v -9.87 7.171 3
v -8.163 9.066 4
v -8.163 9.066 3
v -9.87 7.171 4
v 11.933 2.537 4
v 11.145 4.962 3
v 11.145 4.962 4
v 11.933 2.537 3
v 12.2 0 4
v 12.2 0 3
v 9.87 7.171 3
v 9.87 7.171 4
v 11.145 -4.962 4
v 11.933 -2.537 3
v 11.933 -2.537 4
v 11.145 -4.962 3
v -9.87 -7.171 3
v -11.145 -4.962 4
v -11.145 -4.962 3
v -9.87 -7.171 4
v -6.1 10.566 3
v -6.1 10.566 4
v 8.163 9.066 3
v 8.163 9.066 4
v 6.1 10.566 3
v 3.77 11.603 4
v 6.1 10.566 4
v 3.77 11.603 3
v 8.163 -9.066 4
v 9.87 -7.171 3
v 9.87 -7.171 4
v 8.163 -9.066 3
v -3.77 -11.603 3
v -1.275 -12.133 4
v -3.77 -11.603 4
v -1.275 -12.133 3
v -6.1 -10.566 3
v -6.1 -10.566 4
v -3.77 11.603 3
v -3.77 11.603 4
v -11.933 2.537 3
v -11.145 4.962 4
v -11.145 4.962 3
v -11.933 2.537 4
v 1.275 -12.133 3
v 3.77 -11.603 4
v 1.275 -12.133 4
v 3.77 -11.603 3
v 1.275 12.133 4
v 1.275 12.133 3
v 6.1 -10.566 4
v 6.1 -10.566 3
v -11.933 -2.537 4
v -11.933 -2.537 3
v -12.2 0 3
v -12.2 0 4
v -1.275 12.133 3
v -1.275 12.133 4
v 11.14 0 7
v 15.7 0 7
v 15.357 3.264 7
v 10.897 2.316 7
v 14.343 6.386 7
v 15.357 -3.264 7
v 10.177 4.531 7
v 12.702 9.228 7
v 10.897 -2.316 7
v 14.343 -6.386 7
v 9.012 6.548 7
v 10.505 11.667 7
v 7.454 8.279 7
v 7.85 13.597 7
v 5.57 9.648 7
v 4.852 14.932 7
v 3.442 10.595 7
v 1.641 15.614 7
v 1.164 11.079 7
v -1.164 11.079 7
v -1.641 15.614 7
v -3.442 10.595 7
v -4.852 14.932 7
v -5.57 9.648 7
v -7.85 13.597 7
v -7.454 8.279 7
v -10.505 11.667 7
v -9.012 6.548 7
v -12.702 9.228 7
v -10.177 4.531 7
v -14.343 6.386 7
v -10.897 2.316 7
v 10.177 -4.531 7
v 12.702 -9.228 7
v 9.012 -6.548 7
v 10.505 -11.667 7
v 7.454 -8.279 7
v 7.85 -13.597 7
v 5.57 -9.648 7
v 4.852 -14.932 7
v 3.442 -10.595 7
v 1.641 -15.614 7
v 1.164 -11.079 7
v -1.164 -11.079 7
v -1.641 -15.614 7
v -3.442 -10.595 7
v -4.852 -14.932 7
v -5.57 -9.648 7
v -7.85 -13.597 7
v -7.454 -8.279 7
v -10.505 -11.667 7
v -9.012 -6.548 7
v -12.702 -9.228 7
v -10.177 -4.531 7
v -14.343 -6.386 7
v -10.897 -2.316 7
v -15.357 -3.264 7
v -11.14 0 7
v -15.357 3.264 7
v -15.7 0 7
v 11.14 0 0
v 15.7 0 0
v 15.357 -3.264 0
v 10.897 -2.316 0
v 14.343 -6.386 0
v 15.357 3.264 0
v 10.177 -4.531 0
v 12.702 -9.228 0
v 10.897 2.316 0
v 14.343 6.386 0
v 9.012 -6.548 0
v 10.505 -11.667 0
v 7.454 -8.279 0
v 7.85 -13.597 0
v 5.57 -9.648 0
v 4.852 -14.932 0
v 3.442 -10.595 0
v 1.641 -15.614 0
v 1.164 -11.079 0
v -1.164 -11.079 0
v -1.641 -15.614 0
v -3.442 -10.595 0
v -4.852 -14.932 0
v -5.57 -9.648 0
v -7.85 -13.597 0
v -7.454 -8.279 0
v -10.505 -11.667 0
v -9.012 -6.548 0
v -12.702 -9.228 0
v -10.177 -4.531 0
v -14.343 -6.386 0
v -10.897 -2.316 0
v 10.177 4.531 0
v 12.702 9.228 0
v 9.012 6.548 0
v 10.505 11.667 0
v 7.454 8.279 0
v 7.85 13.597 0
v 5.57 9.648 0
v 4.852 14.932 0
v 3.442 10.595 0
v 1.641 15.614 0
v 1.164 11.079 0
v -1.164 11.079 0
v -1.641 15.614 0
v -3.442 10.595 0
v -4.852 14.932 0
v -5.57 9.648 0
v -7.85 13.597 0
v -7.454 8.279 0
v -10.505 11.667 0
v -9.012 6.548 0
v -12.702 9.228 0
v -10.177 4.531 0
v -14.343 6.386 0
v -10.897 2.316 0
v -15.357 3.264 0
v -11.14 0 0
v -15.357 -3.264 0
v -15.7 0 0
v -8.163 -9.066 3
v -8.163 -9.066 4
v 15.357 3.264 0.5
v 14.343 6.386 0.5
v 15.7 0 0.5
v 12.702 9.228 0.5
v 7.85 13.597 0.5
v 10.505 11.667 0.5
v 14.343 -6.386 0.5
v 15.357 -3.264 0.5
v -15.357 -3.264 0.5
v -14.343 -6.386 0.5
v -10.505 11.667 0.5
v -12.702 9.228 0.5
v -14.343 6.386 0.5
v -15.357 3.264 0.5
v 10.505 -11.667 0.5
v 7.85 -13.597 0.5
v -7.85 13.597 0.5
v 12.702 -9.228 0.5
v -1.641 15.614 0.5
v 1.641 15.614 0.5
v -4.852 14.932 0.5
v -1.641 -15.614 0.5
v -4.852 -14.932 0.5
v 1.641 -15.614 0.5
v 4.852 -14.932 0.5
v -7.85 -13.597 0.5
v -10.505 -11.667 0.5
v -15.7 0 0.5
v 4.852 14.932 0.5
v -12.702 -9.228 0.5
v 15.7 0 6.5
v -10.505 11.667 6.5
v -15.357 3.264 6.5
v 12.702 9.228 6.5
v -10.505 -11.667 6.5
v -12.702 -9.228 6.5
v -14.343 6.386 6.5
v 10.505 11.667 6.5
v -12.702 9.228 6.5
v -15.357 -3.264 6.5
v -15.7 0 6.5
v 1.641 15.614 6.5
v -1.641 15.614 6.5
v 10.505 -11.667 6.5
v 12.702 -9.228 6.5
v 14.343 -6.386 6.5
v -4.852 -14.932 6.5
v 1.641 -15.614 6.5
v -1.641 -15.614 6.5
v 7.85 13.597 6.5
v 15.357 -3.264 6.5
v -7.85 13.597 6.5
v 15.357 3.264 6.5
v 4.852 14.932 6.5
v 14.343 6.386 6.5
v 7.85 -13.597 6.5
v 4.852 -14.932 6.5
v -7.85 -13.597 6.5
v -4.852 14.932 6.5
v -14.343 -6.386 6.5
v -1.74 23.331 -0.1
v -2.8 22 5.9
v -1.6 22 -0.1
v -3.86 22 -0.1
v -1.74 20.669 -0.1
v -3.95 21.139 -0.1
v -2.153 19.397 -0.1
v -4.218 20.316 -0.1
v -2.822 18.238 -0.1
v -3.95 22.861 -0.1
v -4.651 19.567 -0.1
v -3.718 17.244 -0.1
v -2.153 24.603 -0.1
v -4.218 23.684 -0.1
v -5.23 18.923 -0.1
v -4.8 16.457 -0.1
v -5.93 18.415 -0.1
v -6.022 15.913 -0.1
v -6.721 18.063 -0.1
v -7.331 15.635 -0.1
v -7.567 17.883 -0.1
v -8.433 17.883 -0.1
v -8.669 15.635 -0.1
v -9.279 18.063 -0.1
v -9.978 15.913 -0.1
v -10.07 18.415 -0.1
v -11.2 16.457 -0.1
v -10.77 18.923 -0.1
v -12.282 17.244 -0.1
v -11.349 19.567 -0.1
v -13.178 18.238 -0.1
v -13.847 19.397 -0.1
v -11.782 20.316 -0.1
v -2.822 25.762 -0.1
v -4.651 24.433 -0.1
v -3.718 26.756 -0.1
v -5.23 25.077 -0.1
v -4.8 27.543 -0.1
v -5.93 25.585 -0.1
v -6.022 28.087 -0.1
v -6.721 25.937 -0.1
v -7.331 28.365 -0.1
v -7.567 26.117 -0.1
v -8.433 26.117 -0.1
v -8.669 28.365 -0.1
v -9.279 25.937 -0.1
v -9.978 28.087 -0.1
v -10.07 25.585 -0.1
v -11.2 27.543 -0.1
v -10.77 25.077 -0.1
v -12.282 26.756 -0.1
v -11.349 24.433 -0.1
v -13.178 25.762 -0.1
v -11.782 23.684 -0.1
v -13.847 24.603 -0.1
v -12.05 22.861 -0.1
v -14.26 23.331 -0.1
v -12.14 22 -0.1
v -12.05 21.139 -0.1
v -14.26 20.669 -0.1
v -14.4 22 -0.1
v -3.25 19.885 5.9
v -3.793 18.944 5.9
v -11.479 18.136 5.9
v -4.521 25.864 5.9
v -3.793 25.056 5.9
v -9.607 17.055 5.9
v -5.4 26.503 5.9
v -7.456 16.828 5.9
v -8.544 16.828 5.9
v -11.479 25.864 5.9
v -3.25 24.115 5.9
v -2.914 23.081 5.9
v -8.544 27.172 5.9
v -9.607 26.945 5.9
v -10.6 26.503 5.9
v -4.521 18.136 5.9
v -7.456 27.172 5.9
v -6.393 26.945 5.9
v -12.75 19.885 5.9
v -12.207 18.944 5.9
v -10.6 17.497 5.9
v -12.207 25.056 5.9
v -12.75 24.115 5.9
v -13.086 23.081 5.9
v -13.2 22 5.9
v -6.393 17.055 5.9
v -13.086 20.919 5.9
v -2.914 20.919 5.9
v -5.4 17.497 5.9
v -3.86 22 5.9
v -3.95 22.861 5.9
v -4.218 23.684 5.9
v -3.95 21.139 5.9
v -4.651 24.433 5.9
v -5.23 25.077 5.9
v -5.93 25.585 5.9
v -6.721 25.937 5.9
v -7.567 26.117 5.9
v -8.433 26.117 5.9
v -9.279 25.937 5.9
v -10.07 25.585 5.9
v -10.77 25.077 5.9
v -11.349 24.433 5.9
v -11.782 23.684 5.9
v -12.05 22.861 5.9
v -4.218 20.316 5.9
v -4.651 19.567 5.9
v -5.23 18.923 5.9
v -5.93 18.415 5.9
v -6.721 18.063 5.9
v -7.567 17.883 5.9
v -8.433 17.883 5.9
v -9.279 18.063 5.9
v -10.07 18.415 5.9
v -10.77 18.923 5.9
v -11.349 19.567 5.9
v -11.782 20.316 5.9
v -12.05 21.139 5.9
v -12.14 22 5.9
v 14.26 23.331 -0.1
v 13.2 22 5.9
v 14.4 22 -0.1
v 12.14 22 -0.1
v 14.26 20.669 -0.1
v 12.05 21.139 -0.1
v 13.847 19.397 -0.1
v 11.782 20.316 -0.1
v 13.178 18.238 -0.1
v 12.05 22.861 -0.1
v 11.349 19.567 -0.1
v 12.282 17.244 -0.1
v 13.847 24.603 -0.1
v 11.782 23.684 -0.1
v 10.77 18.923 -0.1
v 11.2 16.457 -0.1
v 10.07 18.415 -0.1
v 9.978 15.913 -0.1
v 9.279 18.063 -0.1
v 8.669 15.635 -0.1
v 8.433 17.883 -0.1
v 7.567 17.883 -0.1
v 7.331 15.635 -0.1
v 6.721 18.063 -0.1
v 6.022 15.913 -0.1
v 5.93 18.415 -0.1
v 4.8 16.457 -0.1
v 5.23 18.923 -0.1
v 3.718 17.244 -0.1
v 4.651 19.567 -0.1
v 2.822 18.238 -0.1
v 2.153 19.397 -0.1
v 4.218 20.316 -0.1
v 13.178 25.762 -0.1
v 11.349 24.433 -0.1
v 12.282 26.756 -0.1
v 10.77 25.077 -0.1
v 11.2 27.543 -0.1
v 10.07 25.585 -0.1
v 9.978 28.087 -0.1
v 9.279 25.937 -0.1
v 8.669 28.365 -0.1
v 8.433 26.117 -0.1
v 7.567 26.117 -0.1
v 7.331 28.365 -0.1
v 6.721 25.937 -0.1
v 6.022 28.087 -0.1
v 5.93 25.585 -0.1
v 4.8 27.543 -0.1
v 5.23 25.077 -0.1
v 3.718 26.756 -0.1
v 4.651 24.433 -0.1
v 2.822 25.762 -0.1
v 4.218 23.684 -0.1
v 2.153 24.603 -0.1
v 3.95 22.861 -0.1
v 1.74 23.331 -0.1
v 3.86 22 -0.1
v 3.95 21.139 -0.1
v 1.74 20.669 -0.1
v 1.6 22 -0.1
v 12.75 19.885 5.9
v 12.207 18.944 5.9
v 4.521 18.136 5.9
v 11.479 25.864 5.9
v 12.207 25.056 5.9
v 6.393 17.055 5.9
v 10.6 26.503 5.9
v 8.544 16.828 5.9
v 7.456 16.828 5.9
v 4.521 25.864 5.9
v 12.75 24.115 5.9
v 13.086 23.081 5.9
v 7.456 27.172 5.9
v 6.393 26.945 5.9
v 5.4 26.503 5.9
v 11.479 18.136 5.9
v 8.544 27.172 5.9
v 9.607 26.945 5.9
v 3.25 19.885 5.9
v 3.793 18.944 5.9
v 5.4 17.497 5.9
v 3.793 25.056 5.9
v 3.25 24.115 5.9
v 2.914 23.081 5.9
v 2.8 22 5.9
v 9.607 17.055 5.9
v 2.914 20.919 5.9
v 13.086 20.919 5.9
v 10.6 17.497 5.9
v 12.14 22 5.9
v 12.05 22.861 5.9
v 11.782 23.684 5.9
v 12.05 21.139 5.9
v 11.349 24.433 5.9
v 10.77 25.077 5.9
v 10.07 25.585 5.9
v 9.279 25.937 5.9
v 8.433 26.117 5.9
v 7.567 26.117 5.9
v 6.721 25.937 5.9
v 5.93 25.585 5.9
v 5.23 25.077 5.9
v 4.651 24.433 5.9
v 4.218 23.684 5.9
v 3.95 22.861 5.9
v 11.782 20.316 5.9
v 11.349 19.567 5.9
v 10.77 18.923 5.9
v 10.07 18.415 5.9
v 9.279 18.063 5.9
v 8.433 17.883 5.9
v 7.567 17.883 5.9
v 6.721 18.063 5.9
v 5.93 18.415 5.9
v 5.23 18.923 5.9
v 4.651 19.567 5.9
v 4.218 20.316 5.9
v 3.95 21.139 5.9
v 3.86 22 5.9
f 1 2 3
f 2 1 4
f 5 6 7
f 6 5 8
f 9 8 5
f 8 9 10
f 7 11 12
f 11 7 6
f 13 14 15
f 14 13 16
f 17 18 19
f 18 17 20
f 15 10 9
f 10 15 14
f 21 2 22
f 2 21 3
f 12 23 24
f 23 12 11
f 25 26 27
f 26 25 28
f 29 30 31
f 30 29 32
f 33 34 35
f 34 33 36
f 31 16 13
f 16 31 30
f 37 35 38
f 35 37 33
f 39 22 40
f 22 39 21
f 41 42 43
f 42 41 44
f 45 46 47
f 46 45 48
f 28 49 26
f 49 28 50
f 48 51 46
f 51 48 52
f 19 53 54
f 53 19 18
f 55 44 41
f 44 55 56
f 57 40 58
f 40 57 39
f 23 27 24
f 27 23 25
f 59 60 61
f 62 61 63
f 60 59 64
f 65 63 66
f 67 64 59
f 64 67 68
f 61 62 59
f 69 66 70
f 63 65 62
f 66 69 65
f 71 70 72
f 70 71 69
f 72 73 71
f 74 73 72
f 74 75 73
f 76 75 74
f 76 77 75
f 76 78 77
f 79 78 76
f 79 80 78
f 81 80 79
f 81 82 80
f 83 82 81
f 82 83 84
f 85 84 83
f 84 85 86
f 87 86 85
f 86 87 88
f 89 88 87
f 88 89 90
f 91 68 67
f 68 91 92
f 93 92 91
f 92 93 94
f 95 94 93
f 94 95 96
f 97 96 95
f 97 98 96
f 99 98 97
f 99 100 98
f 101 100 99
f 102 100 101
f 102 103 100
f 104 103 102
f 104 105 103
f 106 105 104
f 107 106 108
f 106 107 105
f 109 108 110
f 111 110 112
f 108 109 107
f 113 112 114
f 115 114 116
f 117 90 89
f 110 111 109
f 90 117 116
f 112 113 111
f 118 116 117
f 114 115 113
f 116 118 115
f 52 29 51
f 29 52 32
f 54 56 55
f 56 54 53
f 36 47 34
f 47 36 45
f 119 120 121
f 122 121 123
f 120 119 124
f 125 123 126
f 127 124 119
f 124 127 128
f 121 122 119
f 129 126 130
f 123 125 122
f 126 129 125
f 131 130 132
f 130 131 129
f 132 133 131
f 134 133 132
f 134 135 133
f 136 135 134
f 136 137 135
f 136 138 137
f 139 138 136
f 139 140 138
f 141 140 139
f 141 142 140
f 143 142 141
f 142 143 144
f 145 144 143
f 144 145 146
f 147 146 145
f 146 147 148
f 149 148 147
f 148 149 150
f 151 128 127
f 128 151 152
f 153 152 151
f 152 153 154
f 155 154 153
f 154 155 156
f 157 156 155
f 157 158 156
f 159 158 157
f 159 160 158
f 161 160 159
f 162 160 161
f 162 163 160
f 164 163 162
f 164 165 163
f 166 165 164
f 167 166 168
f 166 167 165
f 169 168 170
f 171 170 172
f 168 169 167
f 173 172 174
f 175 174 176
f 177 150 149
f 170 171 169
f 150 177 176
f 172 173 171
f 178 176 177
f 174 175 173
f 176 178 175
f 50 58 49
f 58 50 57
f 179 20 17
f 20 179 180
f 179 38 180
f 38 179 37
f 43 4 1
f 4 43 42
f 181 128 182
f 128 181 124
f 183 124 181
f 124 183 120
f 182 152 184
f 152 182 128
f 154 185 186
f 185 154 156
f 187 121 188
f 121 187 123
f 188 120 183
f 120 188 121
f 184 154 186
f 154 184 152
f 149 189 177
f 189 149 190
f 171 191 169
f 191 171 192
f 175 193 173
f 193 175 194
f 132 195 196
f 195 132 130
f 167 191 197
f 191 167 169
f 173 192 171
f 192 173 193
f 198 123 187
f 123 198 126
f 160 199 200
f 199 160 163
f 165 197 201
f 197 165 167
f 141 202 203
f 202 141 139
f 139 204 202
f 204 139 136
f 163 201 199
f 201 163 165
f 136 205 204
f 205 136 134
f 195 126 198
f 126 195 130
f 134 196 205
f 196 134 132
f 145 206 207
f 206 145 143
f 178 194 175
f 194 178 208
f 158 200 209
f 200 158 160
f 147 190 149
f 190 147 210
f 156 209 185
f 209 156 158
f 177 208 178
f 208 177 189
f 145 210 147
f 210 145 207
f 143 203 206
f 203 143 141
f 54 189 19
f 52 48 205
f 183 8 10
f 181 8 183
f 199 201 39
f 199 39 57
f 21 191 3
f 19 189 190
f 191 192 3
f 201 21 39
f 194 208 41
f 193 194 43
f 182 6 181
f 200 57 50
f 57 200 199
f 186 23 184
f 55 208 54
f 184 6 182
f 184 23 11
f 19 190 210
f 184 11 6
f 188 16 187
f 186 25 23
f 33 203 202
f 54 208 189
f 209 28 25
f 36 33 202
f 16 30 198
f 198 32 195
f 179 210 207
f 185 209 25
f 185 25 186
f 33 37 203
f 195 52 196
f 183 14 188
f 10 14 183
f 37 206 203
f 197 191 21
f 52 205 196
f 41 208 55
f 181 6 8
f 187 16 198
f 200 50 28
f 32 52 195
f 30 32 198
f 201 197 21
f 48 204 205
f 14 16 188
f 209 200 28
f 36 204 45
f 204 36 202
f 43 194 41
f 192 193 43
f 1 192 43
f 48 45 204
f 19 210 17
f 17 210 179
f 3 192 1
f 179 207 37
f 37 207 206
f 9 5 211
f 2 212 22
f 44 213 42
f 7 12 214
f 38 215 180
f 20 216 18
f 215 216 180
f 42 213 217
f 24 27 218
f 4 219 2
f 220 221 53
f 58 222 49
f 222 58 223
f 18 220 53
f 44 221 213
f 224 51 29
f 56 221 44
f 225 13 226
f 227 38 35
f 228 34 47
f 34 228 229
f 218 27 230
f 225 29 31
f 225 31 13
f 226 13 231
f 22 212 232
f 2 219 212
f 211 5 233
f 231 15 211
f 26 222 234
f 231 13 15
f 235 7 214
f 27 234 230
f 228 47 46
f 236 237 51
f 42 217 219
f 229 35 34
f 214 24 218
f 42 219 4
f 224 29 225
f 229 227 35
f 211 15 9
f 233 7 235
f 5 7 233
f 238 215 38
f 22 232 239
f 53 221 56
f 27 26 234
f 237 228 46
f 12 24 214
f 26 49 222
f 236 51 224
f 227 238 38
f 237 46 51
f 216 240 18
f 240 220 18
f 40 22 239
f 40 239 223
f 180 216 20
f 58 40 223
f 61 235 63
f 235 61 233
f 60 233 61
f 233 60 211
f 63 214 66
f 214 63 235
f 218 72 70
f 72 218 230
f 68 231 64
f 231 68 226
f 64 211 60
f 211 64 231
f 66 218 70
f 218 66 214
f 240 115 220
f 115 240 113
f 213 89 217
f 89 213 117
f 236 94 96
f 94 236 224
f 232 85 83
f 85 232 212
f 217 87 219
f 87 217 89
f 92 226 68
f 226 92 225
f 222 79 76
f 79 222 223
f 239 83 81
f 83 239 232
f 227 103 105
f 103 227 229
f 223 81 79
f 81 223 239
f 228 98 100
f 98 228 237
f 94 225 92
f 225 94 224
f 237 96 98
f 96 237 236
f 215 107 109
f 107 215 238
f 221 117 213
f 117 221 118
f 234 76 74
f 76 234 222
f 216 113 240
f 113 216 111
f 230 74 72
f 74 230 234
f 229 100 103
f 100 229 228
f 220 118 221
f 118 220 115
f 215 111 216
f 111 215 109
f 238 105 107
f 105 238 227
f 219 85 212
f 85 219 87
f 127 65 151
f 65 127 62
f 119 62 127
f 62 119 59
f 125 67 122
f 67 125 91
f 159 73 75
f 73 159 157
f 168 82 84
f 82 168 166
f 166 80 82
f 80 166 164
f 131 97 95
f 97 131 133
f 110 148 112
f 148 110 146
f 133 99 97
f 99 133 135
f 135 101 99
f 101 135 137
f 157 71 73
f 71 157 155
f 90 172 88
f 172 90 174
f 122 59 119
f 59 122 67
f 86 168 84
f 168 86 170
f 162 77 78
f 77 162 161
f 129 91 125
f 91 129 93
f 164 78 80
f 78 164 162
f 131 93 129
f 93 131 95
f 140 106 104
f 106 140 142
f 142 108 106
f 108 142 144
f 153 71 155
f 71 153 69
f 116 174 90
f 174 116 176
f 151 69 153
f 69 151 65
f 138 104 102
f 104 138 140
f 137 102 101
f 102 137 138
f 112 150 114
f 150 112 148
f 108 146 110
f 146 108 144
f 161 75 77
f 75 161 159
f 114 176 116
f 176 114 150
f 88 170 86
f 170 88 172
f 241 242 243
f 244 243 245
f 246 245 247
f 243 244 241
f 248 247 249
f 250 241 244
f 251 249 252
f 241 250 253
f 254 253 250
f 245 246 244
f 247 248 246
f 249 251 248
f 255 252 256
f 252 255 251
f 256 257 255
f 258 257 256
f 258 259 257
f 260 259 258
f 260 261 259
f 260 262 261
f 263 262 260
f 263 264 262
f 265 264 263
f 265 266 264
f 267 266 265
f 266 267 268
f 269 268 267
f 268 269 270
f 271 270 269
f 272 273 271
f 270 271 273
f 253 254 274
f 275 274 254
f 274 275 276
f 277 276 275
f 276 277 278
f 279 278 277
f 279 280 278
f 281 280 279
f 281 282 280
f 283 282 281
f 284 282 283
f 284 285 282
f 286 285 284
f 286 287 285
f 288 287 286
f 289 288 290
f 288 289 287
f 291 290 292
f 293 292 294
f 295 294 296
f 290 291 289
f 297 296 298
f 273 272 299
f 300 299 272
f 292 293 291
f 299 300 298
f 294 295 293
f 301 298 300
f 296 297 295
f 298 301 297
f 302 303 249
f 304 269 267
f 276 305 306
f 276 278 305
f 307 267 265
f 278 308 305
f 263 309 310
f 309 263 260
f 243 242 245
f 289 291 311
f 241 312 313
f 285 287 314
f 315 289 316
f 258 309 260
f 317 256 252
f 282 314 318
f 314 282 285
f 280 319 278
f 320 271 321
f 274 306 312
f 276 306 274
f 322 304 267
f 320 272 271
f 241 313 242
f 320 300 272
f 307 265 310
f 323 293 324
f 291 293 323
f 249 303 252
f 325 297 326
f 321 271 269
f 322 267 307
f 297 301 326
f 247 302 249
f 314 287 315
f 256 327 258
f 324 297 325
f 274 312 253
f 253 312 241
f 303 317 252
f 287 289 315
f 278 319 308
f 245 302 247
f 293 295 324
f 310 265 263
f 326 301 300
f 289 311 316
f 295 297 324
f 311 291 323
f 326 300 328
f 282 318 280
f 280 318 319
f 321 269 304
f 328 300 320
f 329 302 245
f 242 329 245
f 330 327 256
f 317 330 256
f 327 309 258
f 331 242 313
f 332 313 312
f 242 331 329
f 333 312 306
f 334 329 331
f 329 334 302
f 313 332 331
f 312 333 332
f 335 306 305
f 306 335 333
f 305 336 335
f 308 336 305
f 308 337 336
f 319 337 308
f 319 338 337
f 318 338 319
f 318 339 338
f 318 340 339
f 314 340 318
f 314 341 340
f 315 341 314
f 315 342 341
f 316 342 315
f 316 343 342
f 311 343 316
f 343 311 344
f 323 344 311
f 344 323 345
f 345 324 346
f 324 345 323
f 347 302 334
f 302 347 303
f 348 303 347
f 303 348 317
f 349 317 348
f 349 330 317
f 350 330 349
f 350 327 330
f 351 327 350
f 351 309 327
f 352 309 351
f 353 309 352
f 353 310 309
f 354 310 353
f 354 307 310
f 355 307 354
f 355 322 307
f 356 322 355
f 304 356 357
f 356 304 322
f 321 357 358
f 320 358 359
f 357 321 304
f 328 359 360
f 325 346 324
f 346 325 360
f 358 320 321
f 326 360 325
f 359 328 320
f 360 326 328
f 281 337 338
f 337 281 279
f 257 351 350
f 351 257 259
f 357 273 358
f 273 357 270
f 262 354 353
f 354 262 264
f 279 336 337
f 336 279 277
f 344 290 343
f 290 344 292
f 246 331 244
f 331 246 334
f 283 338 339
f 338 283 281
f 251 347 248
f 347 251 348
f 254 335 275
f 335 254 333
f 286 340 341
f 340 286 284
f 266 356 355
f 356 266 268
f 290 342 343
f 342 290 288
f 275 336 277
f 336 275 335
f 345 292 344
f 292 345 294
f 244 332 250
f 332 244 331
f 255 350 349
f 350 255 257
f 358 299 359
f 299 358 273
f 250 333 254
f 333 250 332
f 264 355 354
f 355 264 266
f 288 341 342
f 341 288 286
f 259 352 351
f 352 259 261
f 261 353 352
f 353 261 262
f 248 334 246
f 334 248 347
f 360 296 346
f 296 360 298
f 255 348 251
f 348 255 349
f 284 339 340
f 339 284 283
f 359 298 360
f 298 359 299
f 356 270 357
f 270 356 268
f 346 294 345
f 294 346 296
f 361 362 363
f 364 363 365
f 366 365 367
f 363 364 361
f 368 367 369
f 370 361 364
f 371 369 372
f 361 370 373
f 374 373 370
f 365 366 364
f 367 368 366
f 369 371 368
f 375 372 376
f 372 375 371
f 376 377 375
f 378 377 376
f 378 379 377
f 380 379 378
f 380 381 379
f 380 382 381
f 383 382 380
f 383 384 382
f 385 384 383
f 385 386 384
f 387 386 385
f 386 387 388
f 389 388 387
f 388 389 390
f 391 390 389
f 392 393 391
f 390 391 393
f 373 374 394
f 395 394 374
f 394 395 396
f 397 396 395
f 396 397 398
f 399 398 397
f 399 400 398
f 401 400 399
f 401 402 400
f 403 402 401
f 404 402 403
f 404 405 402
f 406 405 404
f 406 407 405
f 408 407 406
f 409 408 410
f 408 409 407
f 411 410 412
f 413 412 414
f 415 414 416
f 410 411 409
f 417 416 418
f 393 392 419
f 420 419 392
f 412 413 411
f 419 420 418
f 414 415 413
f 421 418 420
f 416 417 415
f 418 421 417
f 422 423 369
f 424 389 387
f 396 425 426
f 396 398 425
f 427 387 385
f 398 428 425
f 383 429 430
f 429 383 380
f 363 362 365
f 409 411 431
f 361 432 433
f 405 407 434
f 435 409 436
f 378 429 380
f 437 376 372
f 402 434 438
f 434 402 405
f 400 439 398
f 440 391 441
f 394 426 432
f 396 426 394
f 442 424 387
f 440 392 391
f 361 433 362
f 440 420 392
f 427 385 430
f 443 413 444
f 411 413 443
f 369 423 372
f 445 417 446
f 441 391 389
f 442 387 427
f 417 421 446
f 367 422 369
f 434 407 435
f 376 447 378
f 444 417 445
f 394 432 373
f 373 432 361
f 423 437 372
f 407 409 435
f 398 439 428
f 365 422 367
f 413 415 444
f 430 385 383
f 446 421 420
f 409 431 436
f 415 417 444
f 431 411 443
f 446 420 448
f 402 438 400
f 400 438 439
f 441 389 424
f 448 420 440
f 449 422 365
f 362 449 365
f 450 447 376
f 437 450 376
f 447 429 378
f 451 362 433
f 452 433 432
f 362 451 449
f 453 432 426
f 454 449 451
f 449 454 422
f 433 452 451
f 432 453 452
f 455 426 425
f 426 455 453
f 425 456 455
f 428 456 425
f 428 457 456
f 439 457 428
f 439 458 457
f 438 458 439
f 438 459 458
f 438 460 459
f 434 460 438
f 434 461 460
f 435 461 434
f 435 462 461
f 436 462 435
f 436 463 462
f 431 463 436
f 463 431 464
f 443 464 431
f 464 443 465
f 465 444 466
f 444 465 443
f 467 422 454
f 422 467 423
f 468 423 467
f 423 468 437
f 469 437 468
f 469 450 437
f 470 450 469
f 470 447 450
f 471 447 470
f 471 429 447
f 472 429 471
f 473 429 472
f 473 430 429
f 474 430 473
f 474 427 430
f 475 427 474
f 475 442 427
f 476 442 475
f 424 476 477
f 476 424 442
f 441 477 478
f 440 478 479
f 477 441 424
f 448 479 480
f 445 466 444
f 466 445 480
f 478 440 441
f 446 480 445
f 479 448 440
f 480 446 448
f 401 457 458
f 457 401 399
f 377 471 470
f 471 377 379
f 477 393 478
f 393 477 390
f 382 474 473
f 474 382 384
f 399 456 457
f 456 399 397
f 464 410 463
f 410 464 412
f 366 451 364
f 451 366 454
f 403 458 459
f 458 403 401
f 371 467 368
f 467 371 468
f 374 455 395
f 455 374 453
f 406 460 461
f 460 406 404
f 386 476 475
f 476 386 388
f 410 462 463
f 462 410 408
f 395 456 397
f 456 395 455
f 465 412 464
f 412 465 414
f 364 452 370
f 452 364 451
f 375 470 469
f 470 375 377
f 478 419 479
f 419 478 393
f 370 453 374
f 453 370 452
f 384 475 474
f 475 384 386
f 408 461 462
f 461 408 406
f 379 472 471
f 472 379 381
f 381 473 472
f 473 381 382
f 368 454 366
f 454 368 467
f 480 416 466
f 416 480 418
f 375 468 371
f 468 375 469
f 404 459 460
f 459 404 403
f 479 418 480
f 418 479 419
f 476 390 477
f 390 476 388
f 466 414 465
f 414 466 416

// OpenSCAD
$fs=0.2;
//Diametro Carretel 1Kg 
d1=205;
//Diametro Carretel 0.5Kg 
d05=160;
// 80, 100, 65, 85, 100, 70
dist=100;


bearingDiameter=22;
bearingWidth=7;
bearingHole=8;
tolerance=0.28;
wallWidth=4;
thickness=1.2;
axisDiameter=8;
footHeight=25;
space=12;
/***************************************/
bd=bearingDiameter;
bw=bearingWidth;
bh=bearingHole;
ad=axisDiameter;
fh=footHeight;
s=space;
tol=tolerance;
ww=wallWidth;
t=thickness;


/**/
cap();

translate([-bh, bd,-.1]) collar();
translate([ bh, bd,-.1]) collar();

/********
rotate([0,90,0]) cap();
translate([80,0,0])
rotate([0,90,0]) cap();
translate([0,dist,0])
rotate([0,90,0]) cap();
translate([80,dist,0])
rotate([0,90,0]) cap();

translate([-10,0,0])
rotate([0,-90,0]) 
foot();

/**
translate([bw/2,dist/2, d1/2+1])
%rotate([0,90,0]) cylinder(d=d1, h=80);
/**
translate([bw/2,dist/2, d05/2-2])
%rotate([0,90,0]) cylinder(d=d05, h=80);
/**/


module foot(){
    difference() {
        union() {
            hull(){
                cylinder(d=bd, h=ww);

                translate([-bd,0,0])
                cube([10,bd,ww]);
            }
            
            hull(){
                translate([0,dist,0])
                cylinder(d=bd, h=ww);
            
                translate([-bd,dist-bd,0])
                cube([10,bd,ww]);
            }

            translate([-bd,0,0])
            cube([15,dist,ww]);
        }
        
        translate([0,0,-.1])
        cylinder(d=ad+tol, h=s+bw);
        translate([0,dist,-.1])
        cylinder(d=ad+tol, h=s+bw);
    }    
}


module collar(){
    difference() {
        union() {
            cylinder(d1=bh+t*4, d2=bh+t*2, h=s/2);
            
            translate([0,0,s/2])
            cylinder(d=bh, h=bw/2-tol);
        }
        
        translate([0,0,-.1])
        cylinder(d=ad+tol, h=s+bw);
    }    
}

module cap(){
    difference() {
        union() {
            cylinder(d=bd+t*2, h=bw);
            
            
            cylinder(d=bd+t*2+bw, h=.5);
            translate([0,0,.5])
            cylinder(d1=bd+t*2+bw, d2=bd+t*2, h=bw/2-1);
            
            translate([0,0,bw/2+.5])
            cylinder(d2=bd+t*2+bw, d1=bd+t*2, h=bw/2-1);
            translate([0,0,bw-.5])
            cylinder(d=bd+t*2+bw, h=.5);
        }
        
        translate([0,0,-.1])
        cylinder(d=bd+tol, h=bw+1);
    }
}

module holder(){
    translate([wallWidth+spacerDepth+0.15,0,0]) rotate([0,90,0]) %cylinder(7, r=22/2);

    translate([80,0,73])
    rotate([90,0,0])
    import("/home/hespanhol/Downloads/USHR_Foot.stl");


    rotate([0,90,00]) bearingHolder();
    rotate([0,90,00]) translate([0,holderDistance,0]) bearingHolder();


    if (doubleSided) {
    translate([-mainOutlineLength+wallWidth,0,0]) rotate([0,90,00]) bearingHolder();
    translate([-mainOutlineLength+wallWidth,0,0]) rotate([0,90,00]) translate([0,holderDistance,0]) bearingHolder();
    }


    translate([0,0,-wallWidth*7]) scale([wallWidth,holderDistance,wallWidth*3]) cube(1);
}

module mainOutline() {
    union() {
        translate([0,0,0])cylinder(mainOutlineLength, r=bearingRadius+wallWidth/2);
    }
        
    translate([0,-bearingRadius-wallWidth/2,0])
        scale([wallWidth*7, 2*(bearingRadius+wallWidth/2),mainOutlineLength ]) 
        cube(1);
}

module bearingOutline() {
    cubeX=150;
    cubeY=spacerDepth*2+bearingWidth;
    cubeZ=100;
    
    rotate([90,0,-90])
    translate([ -cubeX/2,
                mainOutlineLength/2-cubeY/2,
                //hard coded depth
                -23])
    scale([cubeX,cubeY,cubeZ]) cube(1);
}


module mainCutout() {
    difference() {
        mainOutline();
        bearingOutline();
    }
}

module bearingHolder() {
    difference() {
        union() {
            mainCutout();
            translate([ 0,0, 
                        mainOutlineLength/2+bearingWidth/2]) 
            cylinder(spacerDepth, r1=holderRadius+spacerRadius, r2=holderRadius+spacerRadius+spacerDepth);
            
            
            translate([0,0,
                        mainOutlineLength/2-bearingWidth/2-spacerDepth]) 
            cylinder(spacerDepth, r1=holderRadius+spacerRadius+spacerDepth, r2=holderRadius+spacerRadius);            
        }
        
        translate([0,0,-150]) 
        cylinder(300,r=holderRadius);
    }
}
